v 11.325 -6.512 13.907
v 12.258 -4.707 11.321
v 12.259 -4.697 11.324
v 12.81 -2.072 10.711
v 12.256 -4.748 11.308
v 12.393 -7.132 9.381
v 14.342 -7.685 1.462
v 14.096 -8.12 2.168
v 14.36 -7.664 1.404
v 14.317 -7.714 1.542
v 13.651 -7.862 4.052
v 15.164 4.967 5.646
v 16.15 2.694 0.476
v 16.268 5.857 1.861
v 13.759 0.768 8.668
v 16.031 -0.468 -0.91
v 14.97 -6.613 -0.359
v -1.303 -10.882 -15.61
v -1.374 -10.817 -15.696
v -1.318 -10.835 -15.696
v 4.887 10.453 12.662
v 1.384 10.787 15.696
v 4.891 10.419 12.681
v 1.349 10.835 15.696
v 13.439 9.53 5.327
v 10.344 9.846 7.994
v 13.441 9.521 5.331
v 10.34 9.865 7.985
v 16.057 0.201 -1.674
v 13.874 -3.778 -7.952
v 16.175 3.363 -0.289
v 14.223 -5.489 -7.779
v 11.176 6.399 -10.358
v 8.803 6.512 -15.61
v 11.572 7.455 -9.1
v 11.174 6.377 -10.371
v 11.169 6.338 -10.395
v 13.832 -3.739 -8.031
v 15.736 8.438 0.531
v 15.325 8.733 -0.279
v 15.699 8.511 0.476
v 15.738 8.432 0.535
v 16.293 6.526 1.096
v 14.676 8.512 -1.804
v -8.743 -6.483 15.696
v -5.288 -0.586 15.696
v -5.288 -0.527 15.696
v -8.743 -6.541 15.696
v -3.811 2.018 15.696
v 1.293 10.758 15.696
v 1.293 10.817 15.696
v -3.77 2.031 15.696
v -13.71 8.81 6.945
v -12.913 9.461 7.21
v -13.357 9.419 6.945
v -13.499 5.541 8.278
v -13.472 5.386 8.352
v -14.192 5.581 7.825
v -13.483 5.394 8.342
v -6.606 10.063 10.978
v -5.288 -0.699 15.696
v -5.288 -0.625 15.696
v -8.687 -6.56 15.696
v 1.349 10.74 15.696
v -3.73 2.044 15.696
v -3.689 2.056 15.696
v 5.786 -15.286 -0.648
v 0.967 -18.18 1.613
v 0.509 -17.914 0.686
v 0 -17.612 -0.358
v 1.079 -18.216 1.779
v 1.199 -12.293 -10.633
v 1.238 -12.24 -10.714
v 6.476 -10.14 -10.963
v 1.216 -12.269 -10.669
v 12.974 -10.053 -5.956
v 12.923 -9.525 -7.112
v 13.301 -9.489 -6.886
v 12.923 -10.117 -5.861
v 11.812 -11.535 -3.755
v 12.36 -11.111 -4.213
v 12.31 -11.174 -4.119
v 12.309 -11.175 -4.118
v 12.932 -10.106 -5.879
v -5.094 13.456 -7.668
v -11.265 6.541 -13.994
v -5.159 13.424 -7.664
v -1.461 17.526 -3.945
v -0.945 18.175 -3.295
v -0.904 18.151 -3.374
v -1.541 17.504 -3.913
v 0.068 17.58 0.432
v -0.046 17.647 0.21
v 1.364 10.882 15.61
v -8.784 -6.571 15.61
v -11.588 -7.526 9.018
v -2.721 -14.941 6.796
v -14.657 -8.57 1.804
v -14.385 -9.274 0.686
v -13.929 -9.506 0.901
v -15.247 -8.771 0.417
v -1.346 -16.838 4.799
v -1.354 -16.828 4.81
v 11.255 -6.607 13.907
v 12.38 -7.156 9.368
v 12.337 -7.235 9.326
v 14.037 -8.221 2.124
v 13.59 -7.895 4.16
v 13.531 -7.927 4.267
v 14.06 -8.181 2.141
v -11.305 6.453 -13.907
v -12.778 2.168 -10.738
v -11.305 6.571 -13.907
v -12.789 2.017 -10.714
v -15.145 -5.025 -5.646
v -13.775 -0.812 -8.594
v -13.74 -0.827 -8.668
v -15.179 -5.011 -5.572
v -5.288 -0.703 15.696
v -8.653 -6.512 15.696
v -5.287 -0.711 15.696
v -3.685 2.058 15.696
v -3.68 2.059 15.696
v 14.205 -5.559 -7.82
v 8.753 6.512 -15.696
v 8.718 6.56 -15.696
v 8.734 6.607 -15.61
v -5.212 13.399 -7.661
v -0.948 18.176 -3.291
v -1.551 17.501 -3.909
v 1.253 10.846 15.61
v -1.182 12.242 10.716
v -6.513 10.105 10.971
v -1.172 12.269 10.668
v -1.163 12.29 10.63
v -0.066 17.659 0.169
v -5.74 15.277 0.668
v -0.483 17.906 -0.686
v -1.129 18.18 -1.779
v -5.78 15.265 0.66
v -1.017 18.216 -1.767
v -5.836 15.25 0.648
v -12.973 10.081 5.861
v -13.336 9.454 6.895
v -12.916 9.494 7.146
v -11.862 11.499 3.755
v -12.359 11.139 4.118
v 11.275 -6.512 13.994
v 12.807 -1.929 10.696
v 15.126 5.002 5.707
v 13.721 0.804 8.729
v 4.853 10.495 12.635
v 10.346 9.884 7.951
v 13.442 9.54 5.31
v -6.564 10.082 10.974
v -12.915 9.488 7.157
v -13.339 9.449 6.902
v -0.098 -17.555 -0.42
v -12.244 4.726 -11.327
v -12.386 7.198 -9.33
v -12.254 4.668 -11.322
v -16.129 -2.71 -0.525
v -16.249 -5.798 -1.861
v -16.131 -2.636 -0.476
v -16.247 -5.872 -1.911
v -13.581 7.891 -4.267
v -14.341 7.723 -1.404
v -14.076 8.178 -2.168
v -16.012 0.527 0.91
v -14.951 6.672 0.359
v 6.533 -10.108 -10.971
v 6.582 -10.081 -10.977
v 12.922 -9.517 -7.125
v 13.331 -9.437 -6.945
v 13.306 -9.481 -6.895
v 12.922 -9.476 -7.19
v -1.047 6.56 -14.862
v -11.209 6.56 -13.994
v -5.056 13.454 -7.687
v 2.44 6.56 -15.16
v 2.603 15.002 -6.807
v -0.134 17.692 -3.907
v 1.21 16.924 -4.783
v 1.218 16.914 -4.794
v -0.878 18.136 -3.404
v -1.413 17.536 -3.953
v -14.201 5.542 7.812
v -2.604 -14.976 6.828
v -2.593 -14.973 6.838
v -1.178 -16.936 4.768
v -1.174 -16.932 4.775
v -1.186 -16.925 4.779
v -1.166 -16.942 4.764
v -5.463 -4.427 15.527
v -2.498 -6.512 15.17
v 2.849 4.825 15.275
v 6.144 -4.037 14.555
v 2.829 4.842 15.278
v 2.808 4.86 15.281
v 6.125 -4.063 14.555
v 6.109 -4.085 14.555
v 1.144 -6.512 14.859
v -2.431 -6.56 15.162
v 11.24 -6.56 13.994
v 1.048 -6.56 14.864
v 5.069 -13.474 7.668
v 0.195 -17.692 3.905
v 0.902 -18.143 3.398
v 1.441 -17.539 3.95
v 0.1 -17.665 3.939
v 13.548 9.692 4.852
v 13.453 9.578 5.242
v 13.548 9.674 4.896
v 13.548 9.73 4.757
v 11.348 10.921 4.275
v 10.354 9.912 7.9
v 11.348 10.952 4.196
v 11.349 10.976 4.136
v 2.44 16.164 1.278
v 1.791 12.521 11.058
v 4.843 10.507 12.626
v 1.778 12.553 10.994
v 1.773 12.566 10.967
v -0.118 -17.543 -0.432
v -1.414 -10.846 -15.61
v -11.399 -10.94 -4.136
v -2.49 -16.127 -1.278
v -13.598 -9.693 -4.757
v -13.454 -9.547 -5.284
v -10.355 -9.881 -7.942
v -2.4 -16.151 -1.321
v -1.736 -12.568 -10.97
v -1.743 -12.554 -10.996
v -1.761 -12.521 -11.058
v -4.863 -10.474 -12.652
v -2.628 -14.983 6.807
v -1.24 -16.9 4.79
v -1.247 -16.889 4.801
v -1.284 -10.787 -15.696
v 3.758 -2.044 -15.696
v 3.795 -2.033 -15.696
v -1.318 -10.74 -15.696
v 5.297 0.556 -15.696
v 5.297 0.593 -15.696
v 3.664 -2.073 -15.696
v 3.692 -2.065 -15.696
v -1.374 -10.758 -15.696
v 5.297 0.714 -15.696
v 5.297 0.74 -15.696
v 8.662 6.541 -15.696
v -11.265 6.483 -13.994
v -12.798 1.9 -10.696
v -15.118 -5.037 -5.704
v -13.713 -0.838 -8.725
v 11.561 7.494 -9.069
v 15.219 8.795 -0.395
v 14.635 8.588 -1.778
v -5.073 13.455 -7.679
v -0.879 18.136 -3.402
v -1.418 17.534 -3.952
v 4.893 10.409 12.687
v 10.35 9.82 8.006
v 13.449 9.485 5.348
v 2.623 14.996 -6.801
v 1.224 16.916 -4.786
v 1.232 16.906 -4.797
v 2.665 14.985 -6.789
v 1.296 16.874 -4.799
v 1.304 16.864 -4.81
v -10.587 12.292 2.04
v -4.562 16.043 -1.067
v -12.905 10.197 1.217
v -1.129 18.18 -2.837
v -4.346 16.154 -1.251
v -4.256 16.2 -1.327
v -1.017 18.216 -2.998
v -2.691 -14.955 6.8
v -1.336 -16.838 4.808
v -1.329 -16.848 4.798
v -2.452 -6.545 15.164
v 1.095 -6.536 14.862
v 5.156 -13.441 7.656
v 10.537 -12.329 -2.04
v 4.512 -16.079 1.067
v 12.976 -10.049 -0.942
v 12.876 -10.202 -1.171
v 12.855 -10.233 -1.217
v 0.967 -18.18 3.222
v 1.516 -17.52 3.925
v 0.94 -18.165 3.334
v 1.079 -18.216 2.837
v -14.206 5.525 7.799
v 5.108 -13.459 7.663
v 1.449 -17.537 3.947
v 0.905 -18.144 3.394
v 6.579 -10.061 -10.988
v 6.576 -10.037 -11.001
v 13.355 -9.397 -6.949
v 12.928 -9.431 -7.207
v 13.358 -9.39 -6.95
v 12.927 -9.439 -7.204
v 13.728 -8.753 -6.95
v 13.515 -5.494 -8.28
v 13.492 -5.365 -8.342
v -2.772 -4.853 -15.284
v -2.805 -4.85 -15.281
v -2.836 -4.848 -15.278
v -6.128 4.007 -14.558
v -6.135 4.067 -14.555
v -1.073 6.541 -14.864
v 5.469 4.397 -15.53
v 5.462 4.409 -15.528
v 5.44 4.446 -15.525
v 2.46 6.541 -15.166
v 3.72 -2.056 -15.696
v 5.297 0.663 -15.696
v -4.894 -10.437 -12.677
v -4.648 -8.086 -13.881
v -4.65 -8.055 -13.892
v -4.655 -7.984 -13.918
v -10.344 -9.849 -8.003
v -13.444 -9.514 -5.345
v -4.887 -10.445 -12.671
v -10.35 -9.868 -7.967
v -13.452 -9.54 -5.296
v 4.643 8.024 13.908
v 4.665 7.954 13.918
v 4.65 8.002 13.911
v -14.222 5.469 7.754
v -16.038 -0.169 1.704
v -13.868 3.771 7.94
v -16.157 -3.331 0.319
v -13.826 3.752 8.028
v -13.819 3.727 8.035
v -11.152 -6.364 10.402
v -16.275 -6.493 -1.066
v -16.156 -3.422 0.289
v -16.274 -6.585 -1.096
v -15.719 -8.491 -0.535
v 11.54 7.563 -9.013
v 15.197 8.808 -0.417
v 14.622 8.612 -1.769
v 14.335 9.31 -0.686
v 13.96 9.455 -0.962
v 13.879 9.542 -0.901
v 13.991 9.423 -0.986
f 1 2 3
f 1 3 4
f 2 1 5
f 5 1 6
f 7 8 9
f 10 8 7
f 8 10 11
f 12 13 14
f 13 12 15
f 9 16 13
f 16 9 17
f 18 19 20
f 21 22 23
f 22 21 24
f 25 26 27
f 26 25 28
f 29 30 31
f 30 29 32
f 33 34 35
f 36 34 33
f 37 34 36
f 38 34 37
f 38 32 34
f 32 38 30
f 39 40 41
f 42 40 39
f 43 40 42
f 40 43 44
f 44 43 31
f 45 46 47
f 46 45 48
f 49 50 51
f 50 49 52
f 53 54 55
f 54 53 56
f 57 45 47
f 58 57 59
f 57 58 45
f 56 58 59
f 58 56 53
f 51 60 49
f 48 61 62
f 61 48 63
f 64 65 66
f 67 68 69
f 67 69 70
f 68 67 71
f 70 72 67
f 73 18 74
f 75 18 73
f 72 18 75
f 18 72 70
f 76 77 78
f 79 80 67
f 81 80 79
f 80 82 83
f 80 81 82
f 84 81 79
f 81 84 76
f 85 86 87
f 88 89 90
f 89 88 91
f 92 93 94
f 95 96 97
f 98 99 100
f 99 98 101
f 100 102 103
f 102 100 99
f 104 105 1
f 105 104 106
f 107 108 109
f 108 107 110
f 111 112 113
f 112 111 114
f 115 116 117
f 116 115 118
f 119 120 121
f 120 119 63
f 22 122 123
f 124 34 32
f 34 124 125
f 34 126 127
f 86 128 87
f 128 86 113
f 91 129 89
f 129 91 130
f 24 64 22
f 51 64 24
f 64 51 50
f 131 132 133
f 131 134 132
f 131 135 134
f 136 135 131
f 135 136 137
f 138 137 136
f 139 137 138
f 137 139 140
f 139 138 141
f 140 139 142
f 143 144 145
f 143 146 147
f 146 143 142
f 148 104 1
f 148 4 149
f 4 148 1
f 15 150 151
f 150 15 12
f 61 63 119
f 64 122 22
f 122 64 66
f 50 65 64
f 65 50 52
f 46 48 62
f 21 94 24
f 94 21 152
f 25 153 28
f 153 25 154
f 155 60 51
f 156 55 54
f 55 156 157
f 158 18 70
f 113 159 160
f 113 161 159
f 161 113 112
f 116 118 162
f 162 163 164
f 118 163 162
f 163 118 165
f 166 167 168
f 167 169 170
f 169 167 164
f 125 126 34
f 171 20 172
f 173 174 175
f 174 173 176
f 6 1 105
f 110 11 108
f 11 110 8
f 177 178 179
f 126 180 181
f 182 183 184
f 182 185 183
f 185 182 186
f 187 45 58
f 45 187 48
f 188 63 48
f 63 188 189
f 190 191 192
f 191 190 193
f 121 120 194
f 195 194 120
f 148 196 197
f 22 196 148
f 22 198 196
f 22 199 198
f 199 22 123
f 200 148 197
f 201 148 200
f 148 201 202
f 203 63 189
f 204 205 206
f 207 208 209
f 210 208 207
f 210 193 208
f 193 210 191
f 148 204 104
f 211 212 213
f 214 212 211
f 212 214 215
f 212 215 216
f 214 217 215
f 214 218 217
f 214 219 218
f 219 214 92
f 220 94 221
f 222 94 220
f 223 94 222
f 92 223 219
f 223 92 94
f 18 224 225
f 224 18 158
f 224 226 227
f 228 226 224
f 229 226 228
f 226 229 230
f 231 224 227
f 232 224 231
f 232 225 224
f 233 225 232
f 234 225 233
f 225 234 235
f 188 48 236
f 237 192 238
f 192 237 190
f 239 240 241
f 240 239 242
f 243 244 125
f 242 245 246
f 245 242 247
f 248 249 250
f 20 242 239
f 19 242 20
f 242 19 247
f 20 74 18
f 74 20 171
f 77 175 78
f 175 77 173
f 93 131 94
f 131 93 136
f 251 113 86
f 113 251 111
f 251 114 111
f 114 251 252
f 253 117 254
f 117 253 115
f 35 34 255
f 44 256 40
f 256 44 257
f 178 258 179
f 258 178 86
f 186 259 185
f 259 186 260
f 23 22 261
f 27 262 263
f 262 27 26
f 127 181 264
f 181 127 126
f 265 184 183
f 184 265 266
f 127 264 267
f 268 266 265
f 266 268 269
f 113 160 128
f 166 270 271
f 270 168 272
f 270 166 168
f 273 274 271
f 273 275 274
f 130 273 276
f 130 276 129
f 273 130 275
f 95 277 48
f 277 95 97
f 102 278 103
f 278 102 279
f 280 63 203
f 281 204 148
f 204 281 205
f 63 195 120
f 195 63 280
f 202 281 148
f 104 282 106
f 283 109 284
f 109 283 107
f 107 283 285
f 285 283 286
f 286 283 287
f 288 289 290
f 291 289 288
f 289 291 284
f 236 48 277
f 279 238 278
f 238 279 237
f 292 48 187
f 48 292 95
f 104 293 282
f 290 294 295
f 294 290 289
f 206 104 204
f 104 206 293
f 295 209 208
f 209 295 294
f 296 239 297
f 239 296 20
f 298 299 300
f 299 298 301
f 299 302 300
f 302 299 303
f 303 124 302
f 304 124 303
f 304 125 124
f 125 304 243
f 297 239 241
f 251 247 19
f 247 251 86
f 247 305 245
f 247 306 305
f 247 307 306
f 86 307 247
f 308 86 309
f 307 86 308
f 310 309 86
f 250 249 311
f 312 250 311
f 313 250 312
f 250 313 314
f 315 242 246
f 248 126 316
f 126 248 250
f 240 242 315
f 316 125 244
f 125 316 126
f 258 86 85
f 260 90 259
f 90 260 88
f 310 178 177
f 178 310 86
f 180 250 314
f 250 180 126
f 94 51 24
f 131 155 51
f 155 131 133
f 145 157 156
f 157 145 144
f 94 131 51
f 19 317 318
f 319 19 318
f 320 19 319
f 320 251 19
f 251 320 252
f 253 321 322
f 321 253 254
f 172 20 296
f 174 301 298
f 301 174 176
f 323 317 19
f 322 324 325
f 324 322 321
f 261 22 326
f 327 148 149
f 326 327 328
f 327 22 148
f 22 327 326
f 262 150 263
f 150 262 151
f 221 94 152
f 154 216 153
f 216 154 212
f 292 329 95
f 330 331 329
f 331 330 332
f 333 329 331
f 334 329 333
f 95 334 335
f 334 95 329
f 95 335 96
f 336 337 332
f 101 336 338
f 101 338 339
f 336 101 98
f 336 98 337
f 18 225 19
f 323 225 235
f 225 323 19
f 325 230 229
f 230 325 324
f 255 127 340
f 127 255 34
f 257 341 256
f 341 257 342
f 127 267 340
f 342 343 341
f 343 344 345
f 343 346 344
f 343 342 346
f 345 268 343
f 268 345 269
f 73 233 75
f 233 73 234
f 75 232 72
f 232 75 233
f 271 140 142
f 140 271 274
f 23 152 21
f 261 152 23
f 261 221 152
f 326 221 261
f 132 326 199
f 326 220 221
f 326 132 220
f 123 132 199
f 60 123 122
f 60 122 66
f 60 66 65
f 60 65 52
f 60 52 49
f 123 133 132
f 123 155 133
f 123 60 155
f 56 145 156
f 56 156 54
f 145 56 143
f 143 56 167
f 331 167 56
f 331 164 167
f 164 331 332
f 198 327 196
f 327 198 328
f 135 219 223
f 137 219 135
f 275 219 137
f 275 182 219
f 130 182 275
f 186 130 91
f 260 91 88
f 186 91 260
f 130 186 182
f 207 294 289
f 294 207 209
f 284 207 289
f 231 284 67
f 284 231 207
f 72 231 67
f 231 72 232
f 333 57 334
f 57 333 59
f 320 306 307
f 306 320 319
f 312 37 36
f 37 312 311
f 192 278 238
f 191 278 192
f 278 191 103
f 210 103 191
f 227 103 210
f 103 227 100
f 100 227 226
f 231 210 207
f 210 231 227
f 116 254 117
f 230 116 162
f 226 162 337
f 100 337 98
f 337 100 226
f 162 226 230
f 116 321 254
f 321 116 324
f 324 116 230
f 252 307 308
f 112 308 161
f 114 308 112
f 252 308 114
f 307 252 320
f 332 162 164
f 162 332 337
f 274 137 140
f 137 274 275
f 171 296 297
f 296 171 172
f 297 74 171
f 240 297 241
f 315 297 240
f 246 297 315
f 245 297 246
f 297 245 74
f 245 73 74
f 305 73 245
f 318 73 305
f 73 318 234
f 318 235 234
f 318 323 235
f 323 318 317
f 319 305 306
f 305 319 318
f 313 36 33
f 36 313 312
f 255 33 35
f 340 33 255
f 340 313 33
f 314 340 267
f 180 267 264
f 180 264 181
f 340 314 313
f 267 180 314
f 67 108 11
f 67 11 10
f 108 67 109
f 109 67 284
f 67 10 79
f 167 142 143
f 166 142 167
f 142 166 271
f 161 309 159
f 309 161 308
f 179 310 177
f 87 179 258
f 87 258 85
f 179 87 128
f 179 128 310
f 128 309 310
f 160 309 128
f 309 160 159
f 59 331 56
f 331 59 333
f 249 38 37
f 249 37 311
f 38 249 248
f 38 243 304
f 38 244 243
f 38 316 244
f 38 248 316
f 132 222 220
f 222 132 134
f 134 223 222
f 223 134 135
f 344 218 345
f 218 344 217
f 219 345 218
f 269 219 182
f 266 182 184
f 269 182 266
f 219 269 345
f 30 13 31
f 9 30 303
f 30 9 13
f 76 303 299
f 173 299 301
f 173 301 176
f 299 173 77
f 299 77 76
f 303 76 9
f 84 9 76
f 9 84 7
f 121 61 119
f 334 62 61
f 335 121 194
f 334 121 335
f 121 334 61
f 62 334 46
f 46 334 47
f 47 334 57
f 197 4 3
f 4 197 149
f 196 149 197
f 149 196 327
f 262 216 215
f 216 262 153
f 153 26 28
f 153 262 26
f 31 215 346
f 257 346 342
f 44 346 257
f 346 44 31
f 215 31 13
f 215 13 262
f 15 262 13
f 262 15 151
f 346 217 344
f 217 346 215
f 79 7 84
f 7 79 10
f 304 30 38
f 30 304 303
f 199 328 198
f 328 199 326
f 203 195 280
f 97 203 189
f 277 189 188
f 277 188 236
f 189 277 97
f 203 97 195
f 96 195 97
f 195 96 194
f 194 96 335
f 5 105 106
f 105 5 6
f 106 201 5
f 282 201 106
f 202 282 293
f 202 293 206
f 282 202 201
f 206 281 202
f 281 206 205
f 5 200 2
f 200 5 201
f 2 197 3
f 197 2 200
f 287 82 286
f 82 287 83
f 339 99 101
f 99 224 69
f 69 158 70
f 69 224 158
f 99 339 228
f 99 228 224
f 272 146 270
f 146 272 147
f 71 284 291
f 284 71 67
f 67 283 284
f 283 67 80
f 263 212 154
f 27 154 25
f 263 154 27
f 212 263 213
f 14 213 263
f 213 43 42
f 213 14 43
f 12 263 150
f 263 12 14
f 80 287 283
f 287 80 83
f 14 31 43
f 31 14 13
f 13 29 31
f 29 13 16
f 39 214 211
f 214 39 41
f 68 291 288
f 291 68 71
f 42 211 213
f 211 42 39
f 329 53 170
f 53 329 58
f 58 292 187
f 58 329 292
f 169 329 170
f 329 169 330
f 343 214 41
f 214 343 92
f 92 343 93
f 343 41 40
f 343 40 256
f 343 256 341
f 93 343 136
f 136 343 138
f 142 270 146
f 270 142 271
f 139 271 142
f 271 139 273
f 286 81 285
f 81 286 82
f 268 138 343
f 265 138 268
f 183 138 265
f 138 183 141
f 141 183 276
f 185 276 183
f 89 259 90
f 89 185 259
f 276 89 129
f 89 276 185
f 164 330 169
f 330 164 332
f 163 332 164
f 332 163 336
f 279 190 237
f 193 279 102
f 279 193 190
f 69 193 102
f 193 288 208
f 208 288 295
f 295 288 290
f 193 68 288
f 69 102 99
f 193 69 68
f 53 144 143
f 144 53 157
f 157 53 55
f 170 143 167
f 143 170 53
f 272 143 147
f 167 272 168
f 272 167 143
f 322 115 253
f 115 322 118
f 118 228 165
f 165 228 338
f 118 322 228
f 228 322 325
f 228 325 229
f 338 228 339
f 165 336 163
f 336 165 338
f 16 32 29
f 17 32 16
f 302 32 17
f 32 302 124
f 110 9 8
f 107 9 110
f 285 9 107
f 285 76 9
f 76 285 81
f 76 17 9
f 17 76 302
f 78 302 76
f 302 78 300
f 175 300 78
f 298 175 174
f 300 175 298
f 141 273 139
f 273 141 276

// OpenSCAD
// Auto-generated OpenSCAD file

    shift = 0;

    inner_points = 10*[[-0.10478564415220674, 1.812125352983475, -0.5685557691238555], [-1.2232186825144085, 1.1159039129143473, 0.936231008159878], [-1.5758866823490085, 0.5080249991351536, -0.9362295409773502], [-0.755134871262123, -1.3015966072441039, -1.1634653355233544], [1.6251566094255592, 0.8084820900232448, -0.5685566758925255], [-0.18450606078529752, -0.3180278637050018, 1.8662394755739735], [0.7551348712621214, 1.3015966072441039, 1.1634653355233544], [-1.625156609425561, -0.8084820900232448, 0.5685566758925255], [0.1845060607852959, 0.3180278637050019, -1.8662394755739735], [0.10478564415220516, -1.812125352983475, 0.5685557691238555], [1.2232186825144067, -1.1159039129143473, -0.936231008159878], [1.5758866823490068, -0.5080249991351536, 0.9362295409773502]];

    outer_points_unshifted = 10*[[0.022492027587857028, -1.8836716169952243, 0.2632666647554888], [-1.646420939638002, -0.9154337478589233, -0.26327387176166644], [-0.8702839861489778, -0.6512080335983845, 1.5609509502798178], [0.13335927681165047, 1.0787342199736543, 1.5609554044545926], [1.5779012113784923, -0.9154337478589233, -0.5387418761903946], [-1.1224566938583869, 0.6512080335983845, -1.390702360729757], [-0.13335927681165047, -1.0787342199736543, -1.5609554044545926], [-1.5779012113784923, 0.9154337478589233, 0.5387418761903946], [1.1224566938583869, -0.6512080335983845, 1.390702360729757], [-0.022492027587857028, 1.8836716169952243, -0.2632666647554888], [1.646420939638002, 0.9154337478589233, 0.26327387176166644], [0.8702839861489778, 0.6512080335983845, -1.5609509502798178]];
    
    outer_points = [for (p = outer_points_unshifted) [p[0], p[1], p[2] + shift]];


    // Convex hull for inner set (I)
    module inner_hull() {
        hull() {
            for (p = inner_points) {
                translate(p) sphere(r=0.1);
            }
        }
    }

    // Convex hull for outer set (O) minus inner hull (O \ I)
    module outer_minus_inner() {
        difference() {
            hull() {
                for (p = outer_points) {
                    translate(p) sphere(r=0.1);
                }
            }
            inner_hull(); // Subtract inner hull
        }
    }

    // Convex hull for outer set (O) minus all translated inner hulls
    module outer_minus_AllTranslationInner() {
        difference() {
            hull() {
                for (p = outer_points) {
                    translate(p) sphere(r=0.1);
                }
            }
            hull() {
                translate([0,0,5]) inner_hull();
                translate([0,0,-5]) inner_hull();
            }; // Subtract translated inner hulls
        }
    }

    // Difference between outer_minus_inner and outer_minus_AllTranslationInner
    module outer_minus_inner_diff() {
        difference() {
            // Outer minus inner
            difference() {
                hull() {
                    for (p = outer_points) {
                        translate(p) sphere(r=0.1);
                    }
                }
                inner_hull();
            }

            // Subtract Outer minus AllTranslationInner
            difference() {
                hull() {
                    for (p = outer_points) {
                        translate(p) sphere(r=0.1);
                    }
                }
                hull() {
                    translate([0,0,5]) inner_hull();
                    translate([0,0,-5]) inner_hull();
                };
            }
        }
    }

    // Rendering all with colors applied
    // color([1, 0, 0, 0.5]) inner_hull(); // Transparent red
    // color([0, 1, 0, 1]) outer_minus_AllTranslationInner(); // Opaque green
    color([1, 1, 0, 1]) outer_minus_inner_diff(); // Opaque yellow
    
